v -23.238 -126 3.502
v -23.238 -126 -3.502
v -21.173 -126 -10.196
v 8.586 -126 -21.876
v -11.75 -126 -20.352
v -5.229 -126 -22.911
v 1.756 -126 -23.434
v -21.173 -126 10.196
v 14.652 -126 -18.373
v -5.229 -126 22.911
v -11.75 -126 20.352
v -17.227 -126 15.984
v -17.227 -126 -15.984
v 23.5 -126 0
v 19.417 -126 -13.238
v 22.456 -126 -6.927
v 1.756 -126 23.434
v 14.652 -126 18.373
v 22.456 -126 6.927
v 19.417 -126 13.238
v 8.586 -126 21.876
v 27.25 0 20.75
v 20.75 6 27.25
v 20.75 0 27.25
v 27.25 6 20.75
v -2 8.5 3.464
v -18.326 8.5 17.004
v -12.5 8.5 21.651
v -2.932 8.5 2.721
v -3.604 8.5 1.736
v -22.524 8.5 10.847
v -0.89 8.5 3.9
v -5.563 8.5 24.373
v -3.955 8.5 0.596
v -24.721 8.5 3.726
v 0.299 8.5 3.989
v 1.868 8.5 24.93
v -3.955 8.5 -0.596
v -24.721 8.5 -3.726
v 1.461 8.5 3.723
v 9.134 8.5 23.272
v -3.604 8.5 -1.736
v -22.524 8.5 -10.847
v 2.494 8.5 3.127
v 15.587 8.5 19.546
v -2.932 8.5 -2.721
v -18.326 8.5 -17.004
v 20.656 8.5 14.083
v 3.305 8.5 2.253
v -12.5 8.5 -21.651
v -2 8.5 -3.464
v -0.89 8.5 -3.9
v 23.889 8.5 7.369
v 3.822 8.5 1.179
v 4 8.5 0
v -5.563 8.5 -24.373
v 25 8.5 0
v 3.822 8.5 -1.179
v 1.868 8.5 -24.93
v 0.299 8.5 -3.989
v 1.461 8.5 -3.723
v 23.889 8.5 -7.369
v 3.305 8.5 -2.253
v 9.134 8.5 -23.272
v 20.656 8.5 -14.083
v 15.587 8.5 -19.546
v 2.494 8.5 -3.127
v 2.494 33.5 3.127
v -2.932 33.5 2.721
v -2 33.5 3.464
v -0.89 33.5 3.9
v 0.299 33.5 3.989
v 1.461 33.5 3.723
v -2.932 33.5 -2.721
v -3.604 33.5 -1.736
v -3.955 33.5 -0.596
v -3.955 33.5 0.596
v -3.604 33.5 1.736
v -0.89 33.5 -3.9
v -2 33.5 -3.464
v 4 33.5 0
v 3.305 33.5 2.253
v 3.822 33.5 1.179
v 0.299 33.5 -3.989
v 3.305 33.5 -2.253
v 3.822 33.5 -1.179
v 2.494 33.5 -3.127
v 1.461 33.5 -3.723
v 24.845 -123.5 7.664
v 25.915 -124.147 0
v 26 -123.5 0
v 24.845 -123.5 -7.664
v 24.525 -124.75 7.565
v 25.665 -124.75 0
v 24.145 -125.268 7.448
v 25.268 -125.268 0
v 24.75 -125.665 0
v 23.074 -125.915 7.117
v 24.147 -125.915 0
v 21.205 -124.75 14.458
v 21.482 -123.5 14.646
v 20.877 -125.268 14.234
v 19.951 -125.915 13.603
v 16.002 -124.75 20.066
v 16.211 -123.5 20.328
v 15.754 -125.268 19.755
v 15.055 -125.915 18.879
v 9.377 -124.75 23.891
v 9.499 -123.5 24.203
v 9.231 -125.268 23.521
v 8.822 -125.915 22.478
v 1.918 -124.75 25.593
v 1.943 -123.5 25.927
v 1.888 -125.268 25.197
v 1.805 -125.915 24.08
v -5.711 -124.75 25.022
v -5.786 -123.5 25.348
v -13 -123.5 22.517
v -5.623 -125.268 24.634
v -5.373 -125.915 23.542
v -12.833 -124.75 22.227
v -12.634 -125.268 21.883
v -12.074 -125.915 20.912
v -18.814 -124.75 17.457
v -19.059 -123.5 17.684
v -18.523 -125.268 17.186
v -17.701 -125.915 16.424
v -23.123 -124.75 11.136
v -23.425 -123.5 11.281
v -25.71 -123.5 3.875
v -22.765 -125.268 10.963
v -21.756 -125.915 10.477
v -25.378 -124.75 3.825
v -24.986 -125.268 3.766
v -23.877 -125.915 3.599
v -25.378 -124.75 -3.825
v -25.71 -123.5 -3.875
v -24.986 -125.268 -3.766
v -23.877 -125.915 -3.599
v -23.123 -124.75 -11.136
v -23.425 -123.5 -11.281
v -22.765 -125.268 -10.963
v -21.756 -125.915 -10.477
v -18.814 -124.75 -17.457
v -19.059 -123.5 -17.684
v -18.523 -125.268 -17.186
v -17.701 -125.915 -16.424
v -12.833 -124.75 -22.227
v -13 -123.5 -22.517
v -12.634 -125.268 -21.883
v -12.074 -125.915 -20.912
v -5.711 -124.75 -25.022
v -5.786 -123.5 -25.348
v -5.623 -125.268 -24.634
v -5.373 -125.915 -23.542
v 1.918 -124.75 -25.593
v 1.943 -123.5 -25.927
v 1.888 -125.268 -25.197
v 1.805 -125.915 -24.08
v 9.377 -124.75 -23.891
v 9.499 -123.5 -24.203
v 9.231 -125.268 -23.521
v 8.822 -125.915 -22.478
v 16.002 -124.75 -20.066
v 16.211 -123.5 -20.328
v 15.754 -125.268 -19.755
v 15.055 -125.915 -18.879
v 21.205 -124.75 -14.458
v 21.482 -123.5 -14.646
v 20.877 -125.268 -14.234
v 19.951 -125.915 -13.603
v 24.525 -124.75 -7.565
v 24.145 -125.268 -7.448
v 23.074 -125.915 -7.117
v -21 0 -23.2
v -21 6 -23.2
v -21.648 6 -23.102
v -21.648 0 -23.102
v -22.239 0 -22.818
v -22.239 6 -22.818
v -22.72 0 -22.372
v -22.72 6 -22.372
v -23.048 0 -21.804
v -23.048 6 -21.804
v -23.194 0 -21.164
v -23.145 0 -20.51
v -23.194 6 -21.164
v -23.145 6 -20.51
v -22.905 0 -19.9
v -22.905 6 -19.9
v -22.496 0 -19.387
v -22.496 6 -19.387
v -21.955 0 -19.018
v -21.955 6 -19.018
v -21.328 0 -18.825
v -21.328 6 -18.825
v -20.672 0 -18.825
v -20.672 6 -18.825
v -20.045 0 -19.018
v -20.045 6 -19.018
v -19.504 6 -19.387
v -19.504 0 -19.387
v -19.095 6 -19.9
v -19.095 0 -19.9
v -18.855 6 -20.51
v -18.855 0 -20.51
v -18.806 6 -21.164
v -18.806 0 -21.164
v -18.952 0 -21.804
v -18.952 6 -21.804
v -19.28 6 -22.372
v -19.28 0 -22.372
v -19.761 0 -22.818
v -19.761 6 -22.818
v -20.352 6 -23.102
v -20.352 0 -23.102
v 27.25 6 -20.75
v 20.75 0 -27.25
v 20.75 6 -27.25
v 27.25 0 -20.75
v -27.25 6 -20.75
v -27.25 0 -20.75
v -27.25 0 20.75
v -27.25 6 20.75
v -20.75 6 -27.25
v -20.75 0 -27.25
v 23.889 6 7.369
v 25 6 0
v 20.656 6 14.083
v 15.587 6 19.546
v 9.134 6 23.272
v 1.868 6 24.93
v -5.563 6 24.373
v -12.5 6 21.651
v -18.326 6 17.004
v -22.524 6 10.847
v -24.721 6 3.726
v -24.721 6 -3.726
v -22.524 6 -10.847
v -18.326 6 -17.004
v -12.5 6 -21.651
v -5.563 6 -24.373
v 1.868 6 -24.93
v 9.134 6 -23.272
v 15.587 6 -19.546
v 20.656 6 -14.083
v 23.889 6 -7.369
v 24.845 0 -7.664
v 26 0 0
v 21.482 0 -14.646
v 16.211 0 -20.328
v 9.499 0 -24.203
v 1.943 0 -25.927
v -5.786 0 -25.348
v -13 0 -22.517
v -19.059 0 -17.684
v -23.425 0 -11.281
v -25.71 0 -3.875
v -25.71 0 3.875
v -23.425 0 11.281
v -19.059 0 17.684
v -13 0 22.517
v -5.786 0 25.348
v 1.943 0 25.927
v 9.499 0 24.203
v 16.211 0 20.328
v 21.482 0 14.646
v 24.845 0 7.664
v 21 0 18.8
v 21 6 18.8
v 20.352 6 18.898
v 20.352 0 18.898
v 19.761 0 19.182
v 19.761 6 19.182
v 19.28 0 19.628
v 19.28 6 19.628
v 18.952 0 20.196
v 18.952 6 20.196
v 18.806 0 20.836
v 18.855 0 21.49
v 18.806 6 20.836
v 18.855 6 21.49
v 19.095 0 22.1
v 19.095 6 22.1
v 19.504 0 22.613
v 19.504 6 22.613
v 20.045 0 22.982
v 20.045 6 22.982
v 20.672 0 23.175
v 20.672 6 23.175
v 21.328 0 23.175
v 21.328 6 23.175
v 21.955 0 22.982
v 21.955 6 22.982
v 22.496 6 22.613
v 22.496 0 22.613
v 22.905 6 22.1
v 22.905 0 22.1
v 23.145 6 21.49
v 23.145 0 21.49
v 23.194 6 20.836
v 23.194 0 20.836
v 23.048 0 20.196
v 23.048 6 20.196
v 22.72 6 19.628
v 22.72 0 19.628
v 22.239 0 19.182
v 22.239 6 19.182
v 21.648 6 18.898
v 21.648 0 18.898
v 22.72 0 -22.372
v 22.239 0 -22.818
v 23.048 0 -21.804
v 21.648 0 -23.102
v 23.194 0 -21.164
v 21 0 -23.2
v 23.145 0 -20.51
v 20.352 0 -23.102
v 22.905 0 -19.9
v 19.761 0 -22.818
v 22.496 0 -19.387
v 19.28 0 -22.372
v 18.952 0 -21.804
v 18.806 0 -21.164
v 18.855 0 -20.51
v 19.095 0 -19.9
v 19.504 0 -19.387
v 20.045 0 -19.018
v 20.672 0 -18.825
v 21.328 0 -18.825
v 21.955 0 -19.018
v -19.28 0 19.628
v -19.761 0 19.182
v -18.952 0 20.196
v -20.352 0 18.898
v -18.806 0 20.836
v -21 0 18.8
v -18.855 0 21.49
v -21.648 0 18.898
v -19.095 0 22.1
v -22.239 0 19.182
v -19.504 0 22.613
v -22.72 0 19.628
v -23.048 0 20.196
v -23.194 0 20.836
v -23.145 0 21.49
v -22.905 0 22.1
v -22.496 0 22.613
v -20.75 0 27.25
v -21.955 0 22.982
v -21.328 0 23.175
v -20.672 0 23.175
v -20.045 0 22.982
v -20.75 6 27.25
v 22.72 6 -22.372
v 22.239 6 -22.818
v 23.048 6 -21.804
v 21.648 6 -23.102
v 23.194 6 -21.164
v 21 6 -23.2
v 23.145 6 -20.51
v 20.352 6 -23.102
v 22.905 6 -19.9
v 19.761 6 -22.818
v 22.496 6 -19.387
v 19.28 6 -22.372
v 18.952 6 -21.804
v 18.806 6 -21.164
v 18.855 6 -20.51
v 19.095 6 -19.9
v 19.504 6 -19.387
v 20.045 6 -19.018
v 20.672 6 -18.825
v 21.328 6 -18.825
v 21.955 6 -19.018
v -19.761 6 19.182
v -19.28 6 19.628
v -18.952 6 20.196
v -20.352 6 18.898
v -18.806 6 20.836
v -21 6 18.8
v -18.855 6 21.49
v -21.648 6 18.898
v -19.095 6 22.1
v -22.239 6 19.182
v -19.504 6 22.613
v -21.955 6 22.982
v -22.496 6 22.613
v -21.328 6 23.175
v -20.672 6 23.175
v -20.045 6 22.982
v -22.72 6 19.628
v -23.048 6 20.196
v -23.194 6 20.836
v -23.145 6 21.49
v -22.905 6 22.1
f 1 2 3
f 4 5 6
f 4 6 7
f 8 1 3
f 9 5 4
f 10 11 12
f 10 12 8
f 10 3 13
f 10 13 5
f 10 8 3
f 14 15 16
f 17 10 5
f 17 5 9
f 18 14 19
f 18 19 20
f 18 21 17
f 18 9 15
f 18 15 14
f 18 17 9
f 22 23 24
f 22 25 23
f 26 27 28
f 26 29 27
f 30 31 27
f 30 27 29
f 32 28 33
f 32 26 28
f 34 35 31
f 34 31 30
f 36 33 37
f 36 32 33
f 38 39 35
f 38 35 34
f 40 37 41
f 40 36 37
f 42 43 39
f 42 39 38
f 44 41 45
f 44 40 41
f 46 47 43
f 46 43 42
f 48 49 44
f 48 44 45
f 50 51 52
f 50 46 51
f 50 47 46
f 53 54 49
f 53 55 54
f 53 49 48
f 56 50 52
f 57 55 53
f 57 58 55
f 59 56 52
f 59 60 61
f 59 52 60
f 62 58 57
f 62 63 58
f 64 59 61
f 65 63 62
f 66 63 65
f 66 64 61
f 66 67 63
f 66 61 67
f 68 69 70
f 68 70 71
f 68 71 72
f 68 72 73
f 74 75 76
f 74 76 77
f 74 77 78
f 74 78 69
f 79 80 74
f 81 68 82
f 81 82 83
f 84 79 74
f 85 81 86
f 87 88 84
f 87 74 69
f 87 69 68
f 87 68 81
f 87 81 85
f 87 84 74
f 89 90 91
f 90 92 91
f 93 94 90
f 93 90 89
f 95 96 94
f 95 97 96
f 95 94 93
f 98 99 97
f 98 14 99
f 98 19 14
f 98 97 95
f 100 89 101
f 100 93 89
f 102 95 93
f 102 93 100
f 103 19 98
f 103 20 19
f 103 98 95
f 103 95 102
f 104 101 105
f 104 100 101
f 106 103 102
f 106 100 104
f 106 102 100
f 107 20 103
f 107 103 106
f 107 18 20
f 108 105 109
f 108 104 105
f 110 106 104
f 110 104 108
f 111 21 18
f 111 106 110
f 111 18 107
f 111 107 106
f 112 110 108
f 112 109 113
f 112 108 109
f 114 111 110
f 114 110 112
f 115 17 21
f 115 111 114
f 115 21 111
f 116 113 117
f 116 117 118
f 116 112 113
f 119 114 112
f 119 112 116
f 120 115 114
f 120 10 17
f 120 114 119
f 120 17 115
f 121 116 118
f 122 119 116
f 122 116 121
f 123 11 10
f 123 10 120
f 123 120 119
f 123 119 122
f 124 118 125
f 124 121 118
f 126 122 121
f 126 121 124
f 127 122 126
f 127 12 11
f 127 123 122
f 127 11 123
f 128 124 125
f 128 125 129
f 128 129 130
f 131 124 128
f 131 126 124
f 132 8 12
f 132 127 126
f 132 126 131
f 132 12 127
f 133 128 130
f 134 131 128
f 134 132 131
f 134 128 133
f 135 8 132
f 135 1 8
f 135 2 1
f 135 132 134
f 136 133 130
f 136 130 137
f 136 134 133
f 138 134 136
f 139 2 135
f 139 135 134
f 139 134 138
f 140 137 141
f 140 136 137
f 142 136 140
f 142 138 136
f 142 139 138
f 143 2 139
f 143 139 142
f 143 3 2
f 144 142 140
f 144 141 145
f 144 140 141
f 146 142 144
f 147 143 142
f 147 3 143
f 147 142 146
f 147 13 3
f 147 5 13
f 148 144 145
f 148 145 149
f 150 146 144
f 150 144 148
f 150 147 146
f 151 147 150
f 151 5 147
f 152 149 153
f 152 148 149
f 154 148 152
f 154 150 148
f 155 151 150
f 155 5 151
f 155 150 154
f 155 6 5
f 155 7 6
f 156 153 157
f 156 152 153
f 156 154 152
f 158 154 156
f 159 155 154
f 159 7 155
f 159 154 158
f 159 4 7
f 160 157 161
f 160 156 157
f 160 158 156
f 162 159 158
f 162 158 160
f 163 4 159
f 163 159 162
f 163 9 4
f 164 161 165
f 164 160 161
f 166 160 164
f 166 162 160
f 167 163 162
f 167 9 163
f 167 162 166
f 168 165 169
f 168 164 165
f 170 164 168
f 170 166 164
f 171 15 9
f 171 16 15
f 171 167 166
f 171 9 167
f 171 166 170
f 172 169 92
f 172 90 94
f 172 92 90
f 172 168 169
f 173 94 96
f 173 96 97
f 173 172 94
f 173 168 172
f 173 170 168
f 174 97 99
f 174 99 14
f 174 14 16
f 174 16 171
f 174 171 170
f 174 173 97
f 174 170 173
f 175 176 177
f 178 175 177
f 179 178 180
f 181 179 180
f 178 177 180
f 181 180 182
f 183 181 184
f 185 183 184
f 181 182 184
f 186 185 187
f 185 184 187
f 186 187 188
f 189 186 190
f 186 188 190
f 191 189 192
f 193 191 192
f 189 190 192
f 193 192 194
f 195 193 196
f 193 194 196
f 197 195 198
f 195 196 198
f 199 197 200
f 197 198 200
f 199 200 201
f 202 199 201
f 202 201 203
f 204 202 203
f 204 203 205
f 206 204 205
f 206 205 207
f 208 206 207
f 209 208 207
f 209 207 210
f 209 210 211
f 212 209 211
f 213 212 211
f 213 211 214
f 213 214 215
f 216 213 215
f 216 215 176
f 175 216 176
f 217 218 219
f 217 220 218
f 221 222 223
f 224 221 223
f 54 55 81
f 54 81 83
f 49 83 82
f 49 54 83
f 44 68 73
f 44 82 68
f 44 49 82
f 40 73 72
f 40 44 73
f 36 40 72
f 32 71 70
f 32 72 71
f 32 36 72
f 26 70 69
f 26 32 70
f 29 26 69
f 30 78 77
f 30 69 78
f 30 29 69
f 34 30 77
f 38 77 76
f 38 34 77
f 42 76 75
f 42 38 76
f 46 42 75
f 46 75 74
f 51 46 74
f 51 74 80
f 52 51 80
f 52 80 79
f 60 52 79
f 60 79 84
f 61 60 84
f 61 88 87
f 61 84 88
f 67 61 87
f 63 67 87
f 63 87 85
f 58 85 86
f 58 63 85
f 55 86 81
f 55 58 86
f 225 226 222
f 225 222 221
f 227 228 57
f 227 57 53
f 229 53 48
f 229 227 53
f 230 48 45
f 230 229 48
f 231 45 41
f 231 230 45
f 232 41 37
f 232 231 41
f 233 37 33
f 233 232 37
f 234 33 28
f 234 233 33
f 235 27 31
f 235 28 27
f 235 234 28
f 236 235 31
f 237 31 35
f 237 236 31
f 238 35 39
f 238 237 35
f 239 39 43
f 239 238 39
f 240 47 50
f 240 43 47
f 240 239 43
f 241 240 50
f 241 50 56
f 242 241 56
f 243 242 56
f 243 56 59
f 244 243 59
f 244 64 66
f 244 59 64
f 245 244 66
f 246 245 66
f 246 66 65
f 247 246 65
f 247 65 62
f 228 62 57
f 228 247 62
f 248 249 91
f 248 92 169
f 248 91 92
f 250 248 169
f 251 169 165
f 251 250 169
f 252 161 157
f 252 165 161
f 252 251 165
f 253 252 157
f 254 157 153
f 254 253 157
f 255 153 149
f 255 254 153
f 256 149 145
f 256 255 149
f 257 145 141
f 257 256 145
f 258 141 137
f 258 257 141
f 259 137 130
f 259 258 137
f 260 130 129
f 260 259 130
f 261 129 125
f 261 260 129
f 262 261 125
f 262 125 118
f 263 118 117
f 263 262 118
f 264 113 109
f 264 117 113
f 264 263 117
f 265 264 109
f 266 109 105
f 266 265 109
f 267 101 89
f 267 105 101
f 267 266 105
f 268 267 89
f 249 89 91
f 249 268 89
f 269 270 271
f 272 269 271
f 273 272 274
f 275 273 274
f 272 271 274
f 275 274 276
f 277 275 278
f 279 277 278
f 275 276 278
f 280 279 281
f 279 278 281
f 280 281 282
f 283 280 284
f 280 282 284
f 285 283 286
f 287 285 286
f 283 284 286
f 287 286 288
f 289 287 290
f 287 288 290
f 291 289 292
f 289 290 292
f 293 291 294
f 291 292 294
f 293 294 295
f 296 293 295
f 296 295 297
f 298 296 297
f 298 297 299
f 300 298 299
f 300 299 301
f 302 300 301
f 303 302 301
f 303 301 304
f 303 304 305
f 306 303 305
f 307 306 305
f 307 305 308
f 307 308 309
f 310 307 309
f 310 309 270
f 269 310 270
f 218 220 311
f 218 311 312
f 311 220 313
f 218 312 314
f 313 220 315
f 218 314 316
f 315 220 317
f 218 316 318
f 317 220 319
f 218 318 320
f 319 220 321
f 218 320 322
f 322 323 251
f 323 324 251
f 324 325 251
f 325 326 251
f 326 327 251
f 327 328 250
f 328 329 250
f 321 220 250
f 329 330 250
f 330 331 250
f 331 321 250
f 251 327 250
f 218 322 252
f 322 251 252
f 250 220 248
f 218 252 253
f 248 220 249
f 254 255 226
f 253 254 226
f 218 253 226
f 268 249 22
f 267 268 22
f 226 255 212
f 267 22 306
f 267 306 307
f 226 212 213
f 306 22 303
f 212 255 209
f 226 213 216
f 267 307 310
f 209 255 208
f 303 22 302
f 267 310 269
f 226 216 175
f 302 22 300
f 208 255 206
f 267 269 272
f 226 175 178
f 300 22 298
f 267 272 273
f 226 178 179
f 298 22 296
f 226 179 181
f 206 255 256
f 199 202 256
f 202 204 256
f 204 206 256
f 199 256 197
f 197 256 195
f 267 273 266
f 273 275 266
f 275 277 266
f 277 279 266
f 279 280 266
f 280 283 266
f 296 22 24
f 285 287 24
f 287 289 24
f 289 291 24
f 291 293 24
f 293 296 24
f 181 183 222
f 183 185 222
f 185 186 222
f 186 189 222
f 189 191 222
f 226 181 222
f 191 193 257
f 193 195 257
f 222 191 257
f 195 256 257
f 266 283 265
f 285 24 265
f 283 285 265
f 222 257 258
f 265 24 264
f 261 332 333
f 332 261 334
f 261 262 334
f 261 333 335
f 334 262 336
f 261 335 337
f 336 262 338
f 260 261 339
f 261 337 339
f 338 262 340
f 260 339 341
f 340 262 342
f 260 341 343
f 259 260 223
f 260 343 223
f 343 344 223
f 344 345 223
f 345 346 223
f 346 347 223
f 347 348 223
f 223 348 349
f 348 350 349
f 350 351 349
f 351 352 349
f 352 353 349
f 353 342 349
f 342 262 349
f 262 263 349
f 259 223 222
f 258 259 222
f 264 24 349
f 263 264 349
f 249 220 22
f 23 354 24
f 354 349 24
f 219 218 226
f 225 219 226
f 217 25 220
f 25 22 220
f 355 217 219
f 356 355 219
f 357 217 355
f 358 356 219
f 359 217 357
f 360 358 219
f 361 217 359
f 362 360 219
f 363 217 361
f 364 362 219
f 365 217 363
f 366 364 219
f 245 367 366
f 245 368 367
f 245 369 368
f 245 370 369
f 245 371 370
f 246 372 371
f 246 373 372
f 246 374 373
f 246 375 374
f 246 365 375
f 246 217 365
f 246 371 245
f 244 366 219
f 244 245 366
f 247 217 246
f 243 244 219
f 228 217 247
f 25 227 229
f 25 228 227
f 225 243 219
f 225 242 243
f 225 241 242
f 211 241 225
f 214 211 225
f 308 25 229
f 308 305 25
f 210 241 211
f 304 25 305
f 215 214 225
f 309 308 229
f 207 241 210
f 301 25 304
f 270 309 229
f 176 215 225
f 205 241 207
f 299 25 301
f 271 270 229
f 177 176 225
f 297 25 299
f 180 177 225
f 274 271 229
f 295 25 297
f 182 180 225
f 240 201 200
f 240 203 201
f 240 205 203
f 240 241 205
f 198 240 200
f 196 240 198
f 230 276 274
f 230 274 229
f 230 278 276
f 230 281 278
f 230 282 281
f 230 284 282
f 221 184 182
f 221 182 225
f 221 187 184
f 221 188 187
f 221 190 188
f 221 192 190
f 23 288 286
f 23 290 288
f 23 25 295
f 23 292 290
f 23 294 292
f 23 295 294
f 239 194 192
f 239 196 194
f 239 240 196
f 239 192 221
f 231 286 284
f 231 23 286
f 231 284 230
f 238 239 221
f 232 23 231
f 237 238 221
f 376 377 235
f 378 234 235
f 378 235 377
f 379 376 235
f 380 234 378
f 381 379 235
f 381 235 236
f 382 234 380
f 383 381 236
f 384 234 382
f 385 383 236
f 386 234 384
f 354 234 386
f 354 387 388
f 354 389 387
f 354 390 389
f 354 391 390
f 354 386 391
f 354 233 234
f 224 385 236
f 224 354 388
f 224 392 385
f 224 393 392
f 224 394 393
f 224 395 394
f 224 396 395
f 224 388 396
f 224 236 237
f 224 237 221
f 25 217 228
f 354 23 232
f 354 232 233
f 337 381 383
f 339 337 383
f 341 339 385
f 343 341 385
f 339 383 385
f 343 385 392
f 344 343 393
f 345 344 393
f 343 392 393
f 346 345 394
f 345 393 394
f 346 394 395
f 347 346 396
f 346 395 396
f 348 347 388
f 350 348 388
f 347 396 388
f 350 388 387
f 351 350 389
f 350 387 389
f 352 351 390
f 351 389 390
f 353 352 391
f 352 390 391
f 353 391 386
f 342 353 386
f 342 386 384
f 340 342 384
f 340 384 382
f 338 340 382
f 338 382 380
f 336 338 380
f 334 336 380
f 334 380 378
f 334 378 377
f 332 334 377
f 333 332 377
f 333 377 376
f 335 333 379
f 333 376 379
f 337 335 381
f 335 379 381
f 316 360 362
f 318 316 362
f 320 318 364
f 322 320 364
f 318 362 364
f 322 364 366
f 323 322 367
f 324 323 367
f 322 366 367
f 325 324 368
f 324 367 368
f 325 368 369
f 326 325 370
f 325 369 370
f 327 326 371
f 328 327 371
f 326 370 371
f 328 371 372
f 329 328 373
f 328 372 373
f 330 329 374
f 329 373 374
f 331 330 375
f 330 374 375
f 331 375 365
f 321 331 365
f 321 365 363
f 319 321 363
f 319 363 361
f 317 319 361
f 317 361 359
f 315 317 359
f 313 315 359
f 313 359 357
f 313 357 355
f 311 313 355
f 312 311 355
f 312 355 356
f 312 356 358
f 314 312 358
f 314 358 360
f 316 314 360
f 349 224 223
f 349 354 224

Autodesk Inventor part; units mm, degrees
ref_plane "YZ Plane" through (0, 0, 0) normal (1, 0, 0) x (0, 1, 0)
ref_plane "XZ Plane" through (0, 0, 0) normal (0, 1, 0) x (-1, 0, 0)
ref_plane "XY Plane" through (0, 0, 0) normal (0, 0, 1) x (1, 0, 0)
sketch "Sketch1" plane through (0, 0, 0) normal (0, 1, 0) x (-1, 0, 0)
  line L0 (27.25, 27.25) -> (-27.25, 27.25)
  line L1 (-27.25, 27.25) -> (-27.25, -27.25)
  line L2 (-27.25, -27.25) -> (27.25, -27.25)
  line L3 (27.25, -27.25) -> (27.25, 27.25)
  line L4 (27.25, 27.25) -> (-27.25, -27.25) construction
  line L5 (-27.25, 27.25) -> (27.25, -27.25) construction
  line L6 (21, 21) -> (-21, 21)
  line L7 (-21, 21) -> (-21, -21)
  line L8 (-21, -21) -> (21, -21)
  line L9 (21, -21) -> (21, 21)
  line L10 (21, 21) -> (-21, -21) construction
  line L11 (-21, 21) -> (21, -21) construction
  point P0 (0, 0)
  dimension "d0" = 54.5
  dimension "d1" = 54.5
  dimension "d2" = 42
  dimension "d3" = 42
extrude "Extrusion1" add sketch "Sketch1" along normal blind 6 contours L3 L2 L1 L0 | L9 L8 L7 L6
sketch "Sketch2" plane through (0, 6, 0) normal (0, 1, 0) x (1, 0, 0)
  circle A0 centre (0, 0) radius 25
  dimension "d7" = 50
extrude "Extrusion2" add sketch "Sketch2" along normal blind 2.5
sketch "Sketch3" plane through (0, 0, 0) normal (0, -1, 0) x (1, 0, 0)
  circle A0 centre (0, 0) radius 26
  dimension "d10" = 52
extrude "Extrusion3" add sketch "Sketch3" along normal blind 126
fillet "Fillet1" radius 2.5 1 edges at (-26, -126, 0)
hole "Hole1" at (21, 0, -21) at (21, 0, 21) at (-21, 0, -21) at (-21, 0, 21) direction (0, 1, 0) diameter 4.4 end through all
sketch "Sketch4" plane through (0, 8.5, 0) normal (0, 1, 0) x (1, 0, 0)
  circle A0 centre (0, 0) radius 4
  dimension "d22" = 8
extrude "Extrusion4" add sketch "Sketch4" along normal blind 25
chamfer "Chamfer1" distance 6.5 angle 45 4 edges at (27.25, 3, 27.25) (27.25, 3, -27.25) (-27.25, 3, -27.25) (-27.25, 3, 27.25)
equation "\"d1\" = d0"
equation "\"d3\" = d2"
properties part number "Nanotec-DH052-120E-4N02-Servo"
